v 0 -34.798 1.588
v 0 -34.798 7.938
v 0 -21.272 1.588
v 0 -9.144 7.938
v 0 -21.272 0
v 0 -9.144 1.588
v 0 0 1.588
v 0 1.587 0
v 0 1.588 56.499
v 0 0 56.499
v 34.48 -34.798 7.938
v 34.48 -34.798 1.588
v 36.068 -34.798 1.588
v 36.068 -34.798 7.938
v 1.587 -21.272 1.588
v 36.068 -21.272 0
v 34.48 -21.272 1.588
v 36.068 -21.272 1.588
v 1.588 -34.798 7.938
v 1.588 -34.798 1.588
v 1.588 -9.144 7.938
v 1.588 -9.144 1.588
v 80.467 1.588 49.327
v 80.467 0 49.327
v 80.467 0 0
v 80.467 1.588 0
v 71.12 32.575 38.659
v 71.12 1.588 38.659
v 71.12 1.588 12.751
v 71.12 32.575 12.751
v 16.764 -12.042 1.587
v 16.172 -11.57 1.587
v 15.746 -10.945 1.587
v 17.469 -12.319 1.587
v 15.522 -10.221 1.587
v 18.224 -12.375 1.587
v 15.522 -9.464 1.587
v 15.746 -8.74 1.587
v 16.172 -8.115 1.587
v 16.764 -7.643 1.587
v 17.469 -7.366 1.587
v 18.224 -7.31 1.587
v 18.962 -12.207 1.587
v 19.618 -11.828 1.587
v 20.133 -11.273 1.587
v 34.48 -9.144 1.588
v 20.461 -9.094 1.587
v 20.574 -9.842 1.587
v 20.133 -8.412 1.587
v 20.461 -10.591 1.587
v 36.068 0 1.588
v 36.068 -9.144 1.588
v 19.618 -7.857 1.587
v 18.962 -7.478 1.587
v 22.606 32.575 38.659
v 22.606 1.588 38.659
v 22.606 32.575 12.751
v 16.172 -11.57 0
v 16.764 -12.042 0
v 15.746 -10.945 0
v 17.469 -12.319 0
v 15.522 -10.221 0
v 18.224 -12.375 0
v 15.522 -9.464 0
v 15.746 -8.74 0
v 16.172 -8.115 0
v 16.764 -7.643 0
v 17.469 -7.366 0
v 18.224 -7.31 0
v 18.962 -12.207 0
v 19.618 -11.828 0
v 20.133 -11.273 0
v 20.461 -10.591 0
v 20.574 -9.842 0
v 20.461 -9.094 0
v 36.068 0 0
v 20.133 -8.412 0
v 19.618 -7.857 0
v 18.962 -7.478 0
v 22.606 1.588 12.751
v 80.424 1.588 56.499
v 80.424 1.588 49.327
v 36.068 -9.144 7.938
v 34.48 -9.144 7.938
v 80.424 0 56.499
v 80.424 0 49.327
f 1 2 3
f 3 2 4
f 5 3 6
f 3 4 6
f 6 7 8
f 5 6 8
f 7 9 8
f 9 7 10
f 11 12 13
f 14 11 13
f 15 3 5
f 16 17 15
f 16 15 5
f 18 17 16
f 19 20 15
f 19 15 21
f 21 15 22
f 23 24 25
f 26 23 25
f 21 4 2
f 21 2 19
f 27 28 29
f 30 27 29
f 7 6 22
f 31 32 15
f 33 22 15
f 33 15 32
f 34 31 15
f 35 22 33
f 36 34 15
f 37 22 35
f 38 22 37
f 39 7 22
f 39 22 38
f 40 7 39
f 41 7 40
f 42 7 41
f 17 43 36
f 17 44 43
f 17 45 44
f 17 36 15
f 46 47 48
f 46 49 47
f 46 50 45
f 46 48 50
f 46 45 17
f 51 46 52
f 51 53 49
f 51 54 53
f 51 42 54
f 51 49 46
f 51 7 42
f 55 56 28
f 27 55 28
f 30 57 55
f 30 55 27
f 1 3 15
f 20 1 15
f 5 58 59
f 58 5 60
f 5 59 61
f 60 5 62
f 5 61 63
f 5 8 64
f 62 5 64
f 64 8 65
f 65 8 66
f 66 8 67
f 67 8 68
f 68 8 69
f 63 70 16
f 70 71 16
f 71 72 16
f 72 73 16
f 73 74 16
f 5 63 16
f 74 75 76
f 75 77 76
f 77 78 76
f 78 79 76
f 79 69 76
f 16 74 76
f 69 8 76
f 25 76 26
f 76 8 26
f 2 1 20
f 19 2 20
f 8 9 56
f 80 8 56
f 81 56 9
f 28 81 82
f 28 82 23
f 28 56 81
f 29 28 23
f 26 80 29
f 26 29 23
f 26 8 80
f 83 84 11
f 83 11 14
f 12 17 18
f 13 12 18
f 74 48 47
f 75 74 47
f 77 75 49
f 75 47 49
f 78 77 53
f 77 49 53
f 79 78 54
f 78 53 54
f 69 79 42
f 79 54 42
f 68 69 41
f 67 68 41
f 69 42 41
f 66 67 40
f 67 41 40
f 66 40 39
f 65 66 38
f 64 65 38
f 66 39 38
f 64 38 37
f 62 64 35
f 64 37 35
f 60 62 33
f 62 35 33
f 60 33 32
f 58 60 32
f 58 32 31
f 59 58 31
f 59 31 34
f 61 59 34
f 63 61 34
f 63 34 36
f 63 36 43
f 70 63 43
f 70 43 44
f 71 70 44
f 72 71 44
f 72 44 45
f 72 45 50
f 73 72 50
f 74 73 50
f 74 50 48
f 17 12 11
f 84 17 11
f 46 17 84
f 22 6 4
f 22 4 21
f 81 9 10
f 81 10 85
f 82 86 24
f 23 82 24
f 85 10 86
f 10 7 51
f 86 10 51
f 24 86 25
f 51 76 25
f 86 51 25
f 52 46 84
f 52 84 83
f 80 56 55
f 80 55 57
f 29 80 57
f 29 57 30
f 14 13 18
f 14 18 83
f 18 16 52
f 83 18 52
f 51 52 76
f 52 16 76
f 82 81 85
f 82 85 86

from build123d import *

# Parameters (mm, degrees)
BOSS_EXTRUDE1_DEPTH = 1.5875
SKETCH2_W           = 36.068
SKETCH2_H           = 1.5875
BOSS_EXTRUDE2_DEPTH = 21.2725
SKETCH3_W           = 1.5875
SKETCH3_H           = 25.654
BOSS_EXTRUDE3_DEPTH = 6.35
HOLE1_D             = 5.08
HOLE1_DEPTH         = 15.875
SKETCH9_W           = 48.514
SKETCH9_H           = 25.908
BOSS_EXTRUDE4_DEPTH = 30.988
SKETCH11_W          = 80.424320956
SKETCH11_H          = 56.498512817
BOSS_EXTRUDE5_DEPTH = 1.5875


with BuildPart() as part:
    # Sketch1 → Boss-Extrude1 (new body)
    with BuildSketch(Plane(origin=(0, 0, 0), x_dir=(1, 0, 0), z_dir=(0, 1, 0))):
        Polygon((0, 0), (0, -25.4), (13.2588, -56.388), (31.9532, -56.388), (31.9532, -49.3268), (80.4672, -49.3268), (80.4672, 0), align=None)
    extrude(amount=BOSS_EXTRUDE1_DEPTH)

    # Sketch2 → Boss-Extrude2 (add)
    with BuildSketch(Plane.XZ):
        with Locations((18.034, 0.79375)):
            Rectangle(SKETCH2_W, SKETCH2_H)
    extrude(amount=BOSS_EXTRUDE2_DEPTH)

    # Sketch3 → Boss-Extrude3 (add)
    with BuildSketch(Plane.XY.offset(1.5875)):
        with Locations((35.27425, -21.971)):
            Rectangle(SKETCH3_W, SKETCH3_H)
        with Locations((0.79375, -21.971)):
            Rectangle(SKETCH3_W, SKETCH3_H)
    extrude(amount=BOSS_EXTRUDE3_DEPTH)

    # Hole1
    with Locations(Plane(origin=(0, 0, 0), x_dir=(-1, 0, 0), z_dir=(0, 0, -1))):
        with Locations((-18.034, -9.8425)):
            Hole(HOLE1_D / 2, depth=HOLE1_DEPTH)

    # Sketch9 → Boss-Extrude4 (add)
    with BuildSketch(Plane(origin=(0, 1.5875, 0), x_dir=(1, 0, 0), z_dir=(0, 1, 0))):
        with Locations((46.863, -25.7048)):
            Rectangle(SKETCH9_W, SKETCH9_H)
    extrude(amount=BOSS_EXTRUDE4_DEPTH)

    # Sketch11 → Boss-Extrude5 (add)
    with BuildSketch(Plane(origin=(0, 1.5875, 0), x_dir=(1, 0, 0), z_dir=(0, 1, 0))):
        with Locations((40.212160478, -28.249256409)):
            Rectangle(SKETCH11_W, SKETCH11_H)
    extrude(amount=-BOSS_EXTRUDE5_DEPTH)


solid = part.part
